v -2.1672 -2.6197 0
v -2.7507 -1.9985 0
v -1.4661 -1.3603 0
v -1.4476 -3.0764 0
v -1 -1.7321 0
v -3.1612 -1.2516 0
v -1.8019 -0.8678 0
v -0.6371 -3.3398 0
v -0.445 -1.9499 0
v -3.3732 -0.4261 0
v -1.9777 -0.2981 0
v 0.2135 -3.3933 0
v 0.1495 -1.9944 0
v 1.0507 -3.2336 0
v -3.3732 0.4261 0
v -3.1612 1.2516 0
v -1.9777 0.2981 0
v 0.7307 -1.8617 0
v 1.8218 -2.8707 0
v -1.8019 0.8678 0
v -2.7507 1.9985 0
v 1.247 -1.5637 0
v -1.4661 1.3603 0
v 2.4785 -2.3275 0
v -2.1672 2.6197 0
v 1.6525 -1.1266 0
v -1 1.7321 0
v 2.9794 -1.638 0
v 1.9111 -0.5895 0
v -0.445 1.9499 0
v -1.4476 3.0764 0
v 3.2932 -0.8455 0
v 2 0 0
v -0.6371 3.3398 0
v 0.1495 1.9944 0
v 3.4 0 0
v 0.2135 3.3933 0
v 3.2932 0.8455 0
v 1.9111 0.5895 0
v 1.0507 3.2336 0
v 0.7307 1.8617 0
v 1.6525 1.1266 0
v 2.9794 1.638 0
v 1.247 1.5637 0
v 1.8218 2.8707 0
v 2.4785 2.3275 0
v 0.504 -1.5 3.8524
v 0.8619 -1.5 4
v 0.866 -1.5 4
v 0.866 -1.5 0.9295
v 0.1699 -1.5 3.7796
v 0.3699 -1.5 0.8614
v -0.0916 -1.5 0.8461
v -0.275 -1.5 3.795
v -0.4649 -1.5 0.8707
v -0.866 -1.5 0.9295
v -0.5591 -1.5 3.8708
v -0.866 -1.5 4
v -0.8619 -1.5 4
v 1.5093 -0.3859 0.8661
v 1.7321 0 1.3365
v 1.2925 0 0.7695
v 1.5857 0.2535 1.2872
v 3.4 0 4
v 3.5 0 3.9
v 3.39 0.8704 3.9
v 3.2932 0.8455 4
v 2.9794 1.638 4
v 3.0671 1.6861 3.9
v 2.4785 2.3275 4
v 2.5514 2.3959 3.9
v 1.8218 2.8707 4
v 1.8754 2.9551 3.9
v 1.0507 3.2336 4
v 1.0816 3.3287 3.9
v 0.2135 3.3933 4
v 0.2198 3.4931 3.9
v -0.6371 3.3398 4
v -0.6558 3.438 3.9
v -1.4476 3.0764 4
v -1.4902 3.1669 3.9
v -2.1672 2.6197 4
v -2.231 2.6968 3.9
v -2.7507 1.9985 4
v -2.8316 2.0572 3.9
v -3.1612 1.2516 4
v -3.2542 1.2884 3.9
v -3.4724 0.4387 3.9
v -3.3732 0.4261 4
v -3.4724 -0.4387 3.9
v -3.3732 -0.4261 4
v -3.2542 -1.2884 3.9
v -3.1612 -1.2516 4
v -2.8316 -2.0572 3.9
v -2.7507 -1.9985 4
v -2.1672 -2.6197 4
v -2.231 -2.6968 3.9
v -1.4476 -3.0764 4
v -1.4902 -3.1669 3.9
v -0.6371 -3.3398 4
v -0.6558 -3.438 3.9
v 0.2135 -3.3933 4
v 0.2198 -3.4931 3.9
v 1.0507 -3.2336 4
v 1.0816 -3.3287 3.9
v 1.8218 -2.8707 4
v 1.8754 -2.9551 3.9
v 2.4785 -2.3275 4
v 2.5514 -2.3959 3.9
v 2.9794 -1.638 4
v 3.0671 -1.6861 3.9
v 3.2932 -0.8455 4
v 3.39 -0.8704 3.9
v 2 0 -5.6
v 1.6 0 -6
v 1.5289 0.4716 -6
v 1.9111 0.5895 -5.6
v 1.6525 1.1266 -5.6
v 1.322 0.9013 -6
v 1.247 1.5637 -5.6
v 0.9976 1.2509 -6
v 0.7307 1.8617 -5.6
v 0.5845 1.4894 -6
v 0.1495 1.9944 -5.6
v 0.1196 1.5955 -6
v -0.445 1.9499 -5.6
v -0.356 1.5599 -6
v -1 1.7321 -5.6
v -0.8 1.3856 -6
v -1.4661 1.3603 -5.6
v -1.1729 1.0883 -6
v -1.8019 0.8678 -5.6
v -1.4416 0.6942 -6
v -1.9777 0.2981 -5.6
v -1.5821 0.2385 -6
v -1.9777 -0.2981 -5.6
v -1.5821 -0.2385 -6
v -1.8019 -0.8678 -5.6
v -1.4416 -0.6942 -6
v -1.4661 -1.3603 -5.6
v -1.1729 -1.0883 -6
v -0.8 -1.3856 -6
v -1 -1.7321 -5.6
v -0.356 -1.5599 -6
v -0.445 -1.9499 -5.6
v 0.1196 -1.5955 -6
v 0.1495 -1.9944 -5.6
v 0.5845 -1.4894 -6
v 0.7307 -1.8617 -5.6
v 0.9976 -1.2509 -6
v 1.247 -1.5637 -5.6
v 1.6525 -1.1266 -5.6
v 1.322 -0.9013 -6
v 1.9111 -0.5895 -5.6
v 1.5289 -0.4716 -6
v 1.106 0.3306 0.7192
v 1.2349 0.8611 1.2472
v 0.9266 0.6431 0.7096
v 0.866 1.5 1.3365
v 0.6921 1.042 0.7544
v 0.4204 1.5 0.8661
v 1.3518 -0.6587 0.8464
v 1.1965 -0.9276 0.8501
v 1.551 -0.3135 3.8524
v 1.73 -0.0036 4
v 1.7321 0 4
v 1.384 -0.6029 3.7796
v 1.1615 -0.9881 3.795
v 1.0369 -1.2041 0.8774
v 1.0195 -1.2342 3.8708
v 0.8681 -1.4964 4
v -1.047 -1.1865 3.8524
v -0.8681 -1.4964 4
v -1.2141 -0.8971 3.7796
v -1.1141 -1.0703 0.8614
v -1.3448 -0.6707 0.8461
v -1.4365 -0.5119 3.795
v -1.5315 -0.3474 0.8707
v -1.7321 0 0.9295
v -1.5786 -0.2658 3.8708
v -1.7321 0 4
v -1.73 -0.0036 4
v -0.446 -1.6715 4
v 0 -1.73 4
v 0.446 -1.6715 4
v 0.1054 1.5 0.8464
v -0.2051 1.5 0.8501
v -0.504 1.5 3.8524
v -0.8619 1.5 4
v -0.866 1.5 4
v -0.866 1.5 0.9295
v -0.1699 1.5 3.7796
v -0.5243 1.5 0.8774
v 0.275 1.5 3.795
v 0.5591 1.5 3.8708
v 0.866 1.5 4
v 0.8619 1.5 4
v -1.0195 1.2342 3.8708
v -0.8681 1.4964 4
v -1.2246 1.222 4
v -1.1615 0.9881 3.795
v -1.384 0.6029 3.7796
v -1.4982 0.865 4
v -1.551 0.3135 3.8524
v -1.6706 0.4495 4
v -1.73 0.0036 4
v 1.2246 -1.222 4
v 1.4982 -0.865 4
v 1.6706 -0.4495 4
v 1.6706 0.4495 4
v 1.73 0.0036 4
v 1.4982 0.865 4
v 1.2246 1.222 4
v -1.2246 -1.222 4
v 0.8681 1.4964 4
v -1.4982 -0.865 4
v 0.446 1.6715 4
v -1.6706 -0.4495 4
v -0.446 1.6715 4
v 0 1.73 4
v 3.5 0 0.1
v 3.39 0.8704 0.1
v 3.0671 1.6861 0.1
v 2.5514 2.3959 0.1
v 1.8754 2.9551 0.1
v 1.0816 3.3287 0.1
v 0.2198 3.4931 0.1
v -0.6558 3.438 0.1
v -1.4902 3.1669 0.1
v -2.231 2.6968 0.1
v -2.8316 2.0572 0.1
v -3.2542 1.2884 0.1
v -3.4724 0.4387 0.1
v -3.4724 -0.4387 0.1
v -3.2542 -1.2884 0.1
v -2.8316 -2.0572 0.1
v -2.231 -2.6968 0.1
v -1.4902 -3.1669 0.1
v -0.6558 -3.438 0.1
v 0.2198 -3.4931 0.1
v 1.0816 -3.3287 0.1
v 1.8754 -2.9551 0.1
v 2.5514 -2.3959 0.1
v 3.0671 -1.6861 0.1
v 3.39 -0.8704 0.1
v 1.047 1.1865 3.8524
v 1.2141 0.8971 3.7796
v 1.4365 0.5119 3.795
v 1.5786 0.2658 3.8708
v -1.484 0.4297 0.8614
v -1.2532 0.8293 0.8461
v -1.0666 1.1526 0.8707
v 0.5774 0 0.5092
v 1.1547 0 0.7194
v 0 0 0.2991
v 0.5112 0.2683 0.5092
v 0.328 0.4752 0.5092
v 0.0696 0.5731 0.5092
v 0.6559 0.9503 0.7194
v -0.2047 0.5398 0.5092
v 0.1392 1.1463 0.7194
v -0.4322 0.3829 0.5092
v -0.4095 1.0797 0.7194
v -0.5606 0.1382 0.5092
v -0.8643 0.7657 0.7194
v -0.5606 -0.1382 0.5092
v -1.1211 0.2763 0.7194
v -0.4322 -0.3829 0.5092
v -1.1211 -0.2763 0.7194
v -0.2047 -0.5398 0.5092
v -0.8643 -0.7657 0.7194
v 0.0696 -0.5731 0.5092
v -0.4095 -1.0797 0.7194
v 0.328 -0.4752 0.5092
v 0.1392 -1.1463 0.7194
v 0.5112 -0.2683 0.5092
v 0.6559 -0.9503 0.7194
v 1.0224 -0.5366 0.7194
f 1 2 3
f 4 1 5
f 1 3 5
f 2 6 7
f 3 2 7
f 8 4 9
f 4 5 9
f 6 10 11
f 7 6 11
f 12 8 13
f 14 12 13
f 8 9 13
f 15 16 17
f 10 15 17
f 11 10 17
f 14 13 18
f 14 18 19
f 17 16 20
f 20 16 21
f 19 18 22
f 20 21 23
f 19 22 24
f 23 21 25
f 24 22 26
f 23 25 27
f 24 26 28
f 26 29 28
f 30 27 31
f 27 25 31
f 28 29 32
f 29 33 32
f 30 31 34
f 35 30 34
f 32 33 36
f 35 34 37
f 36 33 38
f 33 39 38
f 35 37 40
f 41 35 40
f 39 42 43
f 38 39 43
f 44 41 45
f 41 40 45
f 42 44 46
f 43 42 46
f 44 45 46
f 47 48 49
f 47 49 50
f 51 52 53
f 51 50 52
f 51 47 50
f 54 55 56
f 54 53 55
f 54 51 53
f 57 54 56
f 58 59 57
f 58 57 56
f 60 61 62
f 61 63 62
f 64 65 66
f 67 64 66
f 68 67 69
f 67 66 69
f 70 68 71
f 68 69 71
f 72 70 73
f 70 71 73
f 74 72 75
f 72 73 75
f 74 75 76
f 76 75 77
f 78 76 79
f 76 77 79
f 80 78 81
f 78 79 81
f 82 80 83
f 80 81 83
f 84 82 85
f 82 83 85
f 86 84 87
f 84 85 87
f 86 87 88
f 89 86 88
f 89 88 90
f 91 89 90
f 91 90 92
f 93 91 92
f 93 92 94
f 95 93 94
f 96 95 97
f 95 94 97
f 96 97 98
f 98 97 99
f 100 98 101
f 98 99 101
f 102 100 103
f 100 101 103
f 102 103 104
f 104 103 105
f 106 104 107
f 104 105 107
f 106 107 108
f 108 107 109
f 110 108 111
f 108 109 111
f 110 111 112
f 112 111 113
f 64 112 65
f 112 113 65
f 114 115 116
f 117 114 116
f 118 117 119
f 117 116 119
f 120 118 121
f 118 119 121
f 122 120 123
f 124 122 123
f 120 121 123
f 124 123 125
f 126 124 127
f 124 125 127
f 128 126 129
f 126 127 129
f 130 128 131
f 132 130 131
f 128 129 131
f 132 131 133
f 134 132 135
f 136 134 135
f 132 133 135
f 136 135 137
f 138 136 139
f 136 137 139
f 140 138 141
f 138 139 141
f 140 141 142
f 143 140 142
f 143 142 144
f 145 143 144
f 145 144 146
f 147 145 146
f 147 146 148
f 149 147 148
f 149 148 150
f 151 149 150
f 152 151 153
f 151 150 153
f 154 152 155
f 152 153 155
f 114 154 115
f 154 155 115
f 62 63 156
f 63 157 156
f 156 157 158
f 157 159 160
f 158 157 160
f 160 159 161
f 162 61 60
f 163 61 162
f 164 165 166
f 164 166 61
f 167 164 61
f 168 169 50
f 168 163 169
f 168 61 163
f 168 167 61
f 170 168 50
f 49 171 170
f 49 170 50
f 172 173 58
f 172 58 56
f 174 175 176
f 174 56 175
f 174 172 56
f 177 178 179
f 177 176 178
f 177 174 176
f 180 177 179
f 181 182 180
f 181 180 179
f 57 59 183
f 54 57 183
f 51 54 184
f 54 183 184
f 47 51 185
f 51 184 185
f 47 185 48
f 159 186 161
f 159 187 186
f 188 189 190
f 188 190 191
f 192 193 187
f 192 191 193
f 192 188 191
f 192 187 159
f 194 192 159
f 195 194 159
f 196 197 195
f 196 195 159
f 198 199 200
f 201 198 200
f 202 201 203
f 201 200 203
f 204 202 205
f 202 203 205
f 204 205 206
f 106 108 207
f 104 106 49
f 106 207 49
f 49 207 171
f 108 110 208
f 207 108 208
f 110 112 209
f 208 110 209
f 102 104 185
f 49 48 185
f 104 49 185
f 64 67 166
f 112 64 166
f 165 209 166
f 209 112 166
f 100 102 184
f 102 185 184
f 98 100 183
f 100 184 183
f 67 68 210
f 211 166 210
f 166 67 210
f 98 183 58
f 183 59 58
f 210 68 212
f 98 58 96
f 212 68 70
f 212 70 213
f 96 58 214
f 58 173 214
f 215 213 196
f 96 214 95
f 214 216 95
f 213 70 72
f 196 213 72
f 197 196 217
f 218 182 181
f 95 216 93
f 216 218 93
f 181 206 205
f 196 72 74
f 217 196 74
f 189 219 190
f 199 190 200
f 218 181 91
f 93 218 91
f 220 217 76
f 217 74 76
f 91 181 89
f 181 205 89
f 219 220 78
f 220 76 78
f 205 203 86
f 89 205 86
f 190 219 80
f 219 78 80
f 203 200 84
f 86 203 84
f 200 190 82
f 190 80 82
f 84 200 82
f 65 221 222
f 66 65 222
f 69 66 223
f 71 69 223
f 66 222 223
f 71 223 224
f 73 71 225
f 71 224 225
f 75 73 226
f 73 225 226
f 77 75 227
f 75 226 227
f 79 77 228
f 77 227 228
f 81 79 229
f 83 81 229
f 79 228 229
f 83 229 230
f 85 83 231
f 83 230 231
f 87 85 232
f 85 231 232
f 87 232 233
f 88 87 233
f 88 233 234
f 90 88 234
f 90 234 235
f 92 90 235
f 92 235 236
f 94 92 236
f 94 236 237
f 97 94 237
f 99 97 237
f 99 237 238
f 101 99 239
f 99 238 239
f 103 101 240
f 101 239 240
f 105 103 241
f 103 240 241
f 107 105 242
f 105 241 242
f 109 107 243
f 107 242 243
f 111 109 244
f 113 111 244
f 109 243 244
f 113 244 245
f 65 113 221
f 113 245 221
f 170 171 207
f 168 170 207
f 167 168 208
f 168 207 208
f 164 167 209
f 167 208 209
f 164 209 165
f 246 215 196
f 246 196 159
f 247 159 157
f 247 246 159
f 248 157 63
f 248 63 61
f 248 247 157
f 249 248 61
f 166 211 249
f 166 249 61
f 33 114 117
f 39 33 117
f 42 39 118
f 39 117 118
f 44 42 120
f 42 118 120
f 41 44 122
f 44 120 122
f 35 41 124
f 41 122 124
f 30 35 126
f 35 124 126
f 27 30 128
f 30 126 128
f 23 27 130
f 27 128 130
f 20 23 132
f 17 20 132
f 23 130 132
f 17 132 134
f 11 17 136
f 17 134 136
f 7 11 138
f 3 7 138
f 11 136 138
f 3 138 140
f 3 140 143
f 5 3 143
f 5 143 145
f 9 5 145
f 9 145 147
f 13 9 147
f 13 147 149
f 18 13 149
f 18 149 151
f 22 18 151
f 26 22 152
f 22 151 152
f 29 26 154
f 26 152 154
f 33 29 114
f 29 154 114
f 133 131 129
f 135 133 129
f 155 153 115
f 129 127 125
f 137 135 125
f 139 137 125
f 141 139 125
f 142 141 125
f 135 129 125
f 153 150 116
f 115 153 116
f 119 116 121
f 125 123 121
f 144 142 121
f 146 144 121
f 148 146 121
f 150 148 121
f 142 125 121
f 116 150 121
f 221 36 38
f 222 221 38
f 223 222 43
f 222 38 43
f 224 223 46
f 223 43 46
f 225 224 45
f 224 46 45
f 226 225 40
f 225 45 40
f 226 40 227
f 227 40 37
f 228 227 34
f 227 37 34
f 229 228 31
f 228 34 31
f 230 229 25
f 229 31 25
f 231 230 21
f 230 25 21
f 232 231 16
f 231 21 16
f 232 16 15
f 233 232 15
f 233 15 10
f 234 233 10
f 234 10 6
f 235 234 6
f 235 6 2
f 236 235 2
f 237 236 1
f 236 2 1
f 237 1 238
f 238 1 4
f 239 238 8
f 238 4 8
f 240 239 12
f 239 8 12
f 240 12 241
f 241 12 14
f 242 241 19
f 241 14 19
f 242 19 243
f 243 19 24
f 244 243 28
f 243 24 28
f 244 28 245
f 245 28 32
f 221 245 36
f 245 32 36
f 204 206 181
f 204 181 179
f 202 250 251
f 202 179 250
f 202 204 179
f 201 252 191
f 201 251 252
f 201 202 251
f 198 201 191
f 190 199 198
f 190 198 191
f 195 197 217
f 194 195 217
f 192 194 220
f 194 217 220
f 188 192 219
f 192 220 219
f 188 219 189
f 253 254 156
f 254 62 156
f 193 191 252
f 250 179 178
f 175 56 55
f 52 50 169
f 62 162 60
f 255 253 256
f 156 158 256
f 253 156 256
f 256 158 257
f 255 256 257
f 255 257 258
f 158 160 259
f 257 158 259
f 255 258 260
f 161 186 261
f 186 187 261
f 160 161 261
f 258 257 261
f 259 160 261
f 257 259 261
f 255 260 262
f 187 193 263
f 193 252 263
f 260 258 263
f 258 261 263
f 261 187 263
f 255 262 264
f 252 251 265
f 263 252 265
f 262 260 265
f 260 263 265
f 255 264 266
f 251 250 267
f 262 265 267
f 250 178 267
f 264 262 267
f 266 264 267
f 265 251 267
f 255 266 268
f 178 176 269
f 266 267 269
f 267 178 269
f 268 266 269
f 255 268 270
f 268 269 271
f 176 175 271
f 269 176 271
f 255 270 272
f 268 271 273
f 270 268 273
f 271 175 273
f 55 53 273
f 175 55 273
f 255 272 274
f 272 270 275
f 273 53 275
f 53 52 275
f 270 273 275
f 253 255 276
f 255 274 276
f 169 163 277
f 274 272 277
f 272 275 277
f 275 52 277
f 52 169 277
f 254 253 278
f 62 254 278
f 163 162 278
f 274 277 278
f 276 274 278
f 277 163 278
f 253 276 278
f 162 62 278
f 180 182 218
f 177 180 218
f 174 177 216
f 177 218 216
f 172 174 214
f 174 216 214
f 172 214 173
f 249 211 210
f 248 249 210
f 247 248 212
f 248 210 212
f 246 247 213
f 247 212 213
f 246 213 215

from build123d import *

# Parameters (mm, degrees)
SKETCH001_R     = 3.75
POCKET_DEPTH    = 9.70192
CHAMFER_SIZE    = 0.4
CHAMFER001_SIZE = 0.1
CHAMFER002_SIZE = 0.4


with BuildPart() as pocket:
    # Sketch003 → Revolution001 (revolve)
    with BuildSketch(Plane.XZ):
        Polygon((0, 0.29908), (2.75, 1.3), (2.75, 10), (0, 10), align=None)
    revolve(axis=Axis((0, 0, 0), (0, 0, 1)))

    # Sketch001 → Pocket (cut, through all)
    with BuildSketch(Plane(origin=(0, 0, 10), x_dir=(-1, 0, 0), z_dir=(0, 0, 1))):
        Circle(SKETCH001_R)
        Polygon((-0.866025, 1.5), (0.866025, 1.5), (1.732051, 0), (0.866025, -1.5), (-0.866025, -1.5), (-1.732051, 0), align=None, mode=Mode.SUBTRACT)
    extrude(amount=-POCKET_DEPTH, mode=Mode.SUBTRACT)


with BuildPart() as chamfer002:
    # Sketch → Revolution (revolve)
    with BuildSketch(Plane.XZ):
        Polygon((1.73, 4), (3.5, 4), (3.5, 0), (2, 0), (2, -6), (0, -6), (0, 2.269998), align=None)
    revolve(axis=Axis((0, 0, 0), (0, 0, 1)))

    # Cut: cut Pocket
    add(pocket.part, mode=Mode.SUBTRACT)

    # Chamfer
    chamfer_edges = [chamfer002.edges().sort_by_distance(p)[0] for p in [
        (1.299038, 0.75, 0.845037),
    ]]
    chamfer(chamfer_edges, length=CHAMFER_SIZE)

    # Chamfer001
    chamfer001_edges = [chamfer002.edges().sort_by_distance(p)[0] for p in [
        (-3.5, 0, 4),
        (-3.5, 0, 0),
    ]]
    chamfer(chamfer001_edges, length=CHAMFER001_SIZE)

    # Chamfer002
    chamfer002_edges = [chamfer002.edges().sort_by_distance(p)[0] for p in [
        (-2, 0, -6),
    ]]
    chamfer(chamfer002_edges, length=CHAMFER002_SIZE)


solid = chamfer002.part
